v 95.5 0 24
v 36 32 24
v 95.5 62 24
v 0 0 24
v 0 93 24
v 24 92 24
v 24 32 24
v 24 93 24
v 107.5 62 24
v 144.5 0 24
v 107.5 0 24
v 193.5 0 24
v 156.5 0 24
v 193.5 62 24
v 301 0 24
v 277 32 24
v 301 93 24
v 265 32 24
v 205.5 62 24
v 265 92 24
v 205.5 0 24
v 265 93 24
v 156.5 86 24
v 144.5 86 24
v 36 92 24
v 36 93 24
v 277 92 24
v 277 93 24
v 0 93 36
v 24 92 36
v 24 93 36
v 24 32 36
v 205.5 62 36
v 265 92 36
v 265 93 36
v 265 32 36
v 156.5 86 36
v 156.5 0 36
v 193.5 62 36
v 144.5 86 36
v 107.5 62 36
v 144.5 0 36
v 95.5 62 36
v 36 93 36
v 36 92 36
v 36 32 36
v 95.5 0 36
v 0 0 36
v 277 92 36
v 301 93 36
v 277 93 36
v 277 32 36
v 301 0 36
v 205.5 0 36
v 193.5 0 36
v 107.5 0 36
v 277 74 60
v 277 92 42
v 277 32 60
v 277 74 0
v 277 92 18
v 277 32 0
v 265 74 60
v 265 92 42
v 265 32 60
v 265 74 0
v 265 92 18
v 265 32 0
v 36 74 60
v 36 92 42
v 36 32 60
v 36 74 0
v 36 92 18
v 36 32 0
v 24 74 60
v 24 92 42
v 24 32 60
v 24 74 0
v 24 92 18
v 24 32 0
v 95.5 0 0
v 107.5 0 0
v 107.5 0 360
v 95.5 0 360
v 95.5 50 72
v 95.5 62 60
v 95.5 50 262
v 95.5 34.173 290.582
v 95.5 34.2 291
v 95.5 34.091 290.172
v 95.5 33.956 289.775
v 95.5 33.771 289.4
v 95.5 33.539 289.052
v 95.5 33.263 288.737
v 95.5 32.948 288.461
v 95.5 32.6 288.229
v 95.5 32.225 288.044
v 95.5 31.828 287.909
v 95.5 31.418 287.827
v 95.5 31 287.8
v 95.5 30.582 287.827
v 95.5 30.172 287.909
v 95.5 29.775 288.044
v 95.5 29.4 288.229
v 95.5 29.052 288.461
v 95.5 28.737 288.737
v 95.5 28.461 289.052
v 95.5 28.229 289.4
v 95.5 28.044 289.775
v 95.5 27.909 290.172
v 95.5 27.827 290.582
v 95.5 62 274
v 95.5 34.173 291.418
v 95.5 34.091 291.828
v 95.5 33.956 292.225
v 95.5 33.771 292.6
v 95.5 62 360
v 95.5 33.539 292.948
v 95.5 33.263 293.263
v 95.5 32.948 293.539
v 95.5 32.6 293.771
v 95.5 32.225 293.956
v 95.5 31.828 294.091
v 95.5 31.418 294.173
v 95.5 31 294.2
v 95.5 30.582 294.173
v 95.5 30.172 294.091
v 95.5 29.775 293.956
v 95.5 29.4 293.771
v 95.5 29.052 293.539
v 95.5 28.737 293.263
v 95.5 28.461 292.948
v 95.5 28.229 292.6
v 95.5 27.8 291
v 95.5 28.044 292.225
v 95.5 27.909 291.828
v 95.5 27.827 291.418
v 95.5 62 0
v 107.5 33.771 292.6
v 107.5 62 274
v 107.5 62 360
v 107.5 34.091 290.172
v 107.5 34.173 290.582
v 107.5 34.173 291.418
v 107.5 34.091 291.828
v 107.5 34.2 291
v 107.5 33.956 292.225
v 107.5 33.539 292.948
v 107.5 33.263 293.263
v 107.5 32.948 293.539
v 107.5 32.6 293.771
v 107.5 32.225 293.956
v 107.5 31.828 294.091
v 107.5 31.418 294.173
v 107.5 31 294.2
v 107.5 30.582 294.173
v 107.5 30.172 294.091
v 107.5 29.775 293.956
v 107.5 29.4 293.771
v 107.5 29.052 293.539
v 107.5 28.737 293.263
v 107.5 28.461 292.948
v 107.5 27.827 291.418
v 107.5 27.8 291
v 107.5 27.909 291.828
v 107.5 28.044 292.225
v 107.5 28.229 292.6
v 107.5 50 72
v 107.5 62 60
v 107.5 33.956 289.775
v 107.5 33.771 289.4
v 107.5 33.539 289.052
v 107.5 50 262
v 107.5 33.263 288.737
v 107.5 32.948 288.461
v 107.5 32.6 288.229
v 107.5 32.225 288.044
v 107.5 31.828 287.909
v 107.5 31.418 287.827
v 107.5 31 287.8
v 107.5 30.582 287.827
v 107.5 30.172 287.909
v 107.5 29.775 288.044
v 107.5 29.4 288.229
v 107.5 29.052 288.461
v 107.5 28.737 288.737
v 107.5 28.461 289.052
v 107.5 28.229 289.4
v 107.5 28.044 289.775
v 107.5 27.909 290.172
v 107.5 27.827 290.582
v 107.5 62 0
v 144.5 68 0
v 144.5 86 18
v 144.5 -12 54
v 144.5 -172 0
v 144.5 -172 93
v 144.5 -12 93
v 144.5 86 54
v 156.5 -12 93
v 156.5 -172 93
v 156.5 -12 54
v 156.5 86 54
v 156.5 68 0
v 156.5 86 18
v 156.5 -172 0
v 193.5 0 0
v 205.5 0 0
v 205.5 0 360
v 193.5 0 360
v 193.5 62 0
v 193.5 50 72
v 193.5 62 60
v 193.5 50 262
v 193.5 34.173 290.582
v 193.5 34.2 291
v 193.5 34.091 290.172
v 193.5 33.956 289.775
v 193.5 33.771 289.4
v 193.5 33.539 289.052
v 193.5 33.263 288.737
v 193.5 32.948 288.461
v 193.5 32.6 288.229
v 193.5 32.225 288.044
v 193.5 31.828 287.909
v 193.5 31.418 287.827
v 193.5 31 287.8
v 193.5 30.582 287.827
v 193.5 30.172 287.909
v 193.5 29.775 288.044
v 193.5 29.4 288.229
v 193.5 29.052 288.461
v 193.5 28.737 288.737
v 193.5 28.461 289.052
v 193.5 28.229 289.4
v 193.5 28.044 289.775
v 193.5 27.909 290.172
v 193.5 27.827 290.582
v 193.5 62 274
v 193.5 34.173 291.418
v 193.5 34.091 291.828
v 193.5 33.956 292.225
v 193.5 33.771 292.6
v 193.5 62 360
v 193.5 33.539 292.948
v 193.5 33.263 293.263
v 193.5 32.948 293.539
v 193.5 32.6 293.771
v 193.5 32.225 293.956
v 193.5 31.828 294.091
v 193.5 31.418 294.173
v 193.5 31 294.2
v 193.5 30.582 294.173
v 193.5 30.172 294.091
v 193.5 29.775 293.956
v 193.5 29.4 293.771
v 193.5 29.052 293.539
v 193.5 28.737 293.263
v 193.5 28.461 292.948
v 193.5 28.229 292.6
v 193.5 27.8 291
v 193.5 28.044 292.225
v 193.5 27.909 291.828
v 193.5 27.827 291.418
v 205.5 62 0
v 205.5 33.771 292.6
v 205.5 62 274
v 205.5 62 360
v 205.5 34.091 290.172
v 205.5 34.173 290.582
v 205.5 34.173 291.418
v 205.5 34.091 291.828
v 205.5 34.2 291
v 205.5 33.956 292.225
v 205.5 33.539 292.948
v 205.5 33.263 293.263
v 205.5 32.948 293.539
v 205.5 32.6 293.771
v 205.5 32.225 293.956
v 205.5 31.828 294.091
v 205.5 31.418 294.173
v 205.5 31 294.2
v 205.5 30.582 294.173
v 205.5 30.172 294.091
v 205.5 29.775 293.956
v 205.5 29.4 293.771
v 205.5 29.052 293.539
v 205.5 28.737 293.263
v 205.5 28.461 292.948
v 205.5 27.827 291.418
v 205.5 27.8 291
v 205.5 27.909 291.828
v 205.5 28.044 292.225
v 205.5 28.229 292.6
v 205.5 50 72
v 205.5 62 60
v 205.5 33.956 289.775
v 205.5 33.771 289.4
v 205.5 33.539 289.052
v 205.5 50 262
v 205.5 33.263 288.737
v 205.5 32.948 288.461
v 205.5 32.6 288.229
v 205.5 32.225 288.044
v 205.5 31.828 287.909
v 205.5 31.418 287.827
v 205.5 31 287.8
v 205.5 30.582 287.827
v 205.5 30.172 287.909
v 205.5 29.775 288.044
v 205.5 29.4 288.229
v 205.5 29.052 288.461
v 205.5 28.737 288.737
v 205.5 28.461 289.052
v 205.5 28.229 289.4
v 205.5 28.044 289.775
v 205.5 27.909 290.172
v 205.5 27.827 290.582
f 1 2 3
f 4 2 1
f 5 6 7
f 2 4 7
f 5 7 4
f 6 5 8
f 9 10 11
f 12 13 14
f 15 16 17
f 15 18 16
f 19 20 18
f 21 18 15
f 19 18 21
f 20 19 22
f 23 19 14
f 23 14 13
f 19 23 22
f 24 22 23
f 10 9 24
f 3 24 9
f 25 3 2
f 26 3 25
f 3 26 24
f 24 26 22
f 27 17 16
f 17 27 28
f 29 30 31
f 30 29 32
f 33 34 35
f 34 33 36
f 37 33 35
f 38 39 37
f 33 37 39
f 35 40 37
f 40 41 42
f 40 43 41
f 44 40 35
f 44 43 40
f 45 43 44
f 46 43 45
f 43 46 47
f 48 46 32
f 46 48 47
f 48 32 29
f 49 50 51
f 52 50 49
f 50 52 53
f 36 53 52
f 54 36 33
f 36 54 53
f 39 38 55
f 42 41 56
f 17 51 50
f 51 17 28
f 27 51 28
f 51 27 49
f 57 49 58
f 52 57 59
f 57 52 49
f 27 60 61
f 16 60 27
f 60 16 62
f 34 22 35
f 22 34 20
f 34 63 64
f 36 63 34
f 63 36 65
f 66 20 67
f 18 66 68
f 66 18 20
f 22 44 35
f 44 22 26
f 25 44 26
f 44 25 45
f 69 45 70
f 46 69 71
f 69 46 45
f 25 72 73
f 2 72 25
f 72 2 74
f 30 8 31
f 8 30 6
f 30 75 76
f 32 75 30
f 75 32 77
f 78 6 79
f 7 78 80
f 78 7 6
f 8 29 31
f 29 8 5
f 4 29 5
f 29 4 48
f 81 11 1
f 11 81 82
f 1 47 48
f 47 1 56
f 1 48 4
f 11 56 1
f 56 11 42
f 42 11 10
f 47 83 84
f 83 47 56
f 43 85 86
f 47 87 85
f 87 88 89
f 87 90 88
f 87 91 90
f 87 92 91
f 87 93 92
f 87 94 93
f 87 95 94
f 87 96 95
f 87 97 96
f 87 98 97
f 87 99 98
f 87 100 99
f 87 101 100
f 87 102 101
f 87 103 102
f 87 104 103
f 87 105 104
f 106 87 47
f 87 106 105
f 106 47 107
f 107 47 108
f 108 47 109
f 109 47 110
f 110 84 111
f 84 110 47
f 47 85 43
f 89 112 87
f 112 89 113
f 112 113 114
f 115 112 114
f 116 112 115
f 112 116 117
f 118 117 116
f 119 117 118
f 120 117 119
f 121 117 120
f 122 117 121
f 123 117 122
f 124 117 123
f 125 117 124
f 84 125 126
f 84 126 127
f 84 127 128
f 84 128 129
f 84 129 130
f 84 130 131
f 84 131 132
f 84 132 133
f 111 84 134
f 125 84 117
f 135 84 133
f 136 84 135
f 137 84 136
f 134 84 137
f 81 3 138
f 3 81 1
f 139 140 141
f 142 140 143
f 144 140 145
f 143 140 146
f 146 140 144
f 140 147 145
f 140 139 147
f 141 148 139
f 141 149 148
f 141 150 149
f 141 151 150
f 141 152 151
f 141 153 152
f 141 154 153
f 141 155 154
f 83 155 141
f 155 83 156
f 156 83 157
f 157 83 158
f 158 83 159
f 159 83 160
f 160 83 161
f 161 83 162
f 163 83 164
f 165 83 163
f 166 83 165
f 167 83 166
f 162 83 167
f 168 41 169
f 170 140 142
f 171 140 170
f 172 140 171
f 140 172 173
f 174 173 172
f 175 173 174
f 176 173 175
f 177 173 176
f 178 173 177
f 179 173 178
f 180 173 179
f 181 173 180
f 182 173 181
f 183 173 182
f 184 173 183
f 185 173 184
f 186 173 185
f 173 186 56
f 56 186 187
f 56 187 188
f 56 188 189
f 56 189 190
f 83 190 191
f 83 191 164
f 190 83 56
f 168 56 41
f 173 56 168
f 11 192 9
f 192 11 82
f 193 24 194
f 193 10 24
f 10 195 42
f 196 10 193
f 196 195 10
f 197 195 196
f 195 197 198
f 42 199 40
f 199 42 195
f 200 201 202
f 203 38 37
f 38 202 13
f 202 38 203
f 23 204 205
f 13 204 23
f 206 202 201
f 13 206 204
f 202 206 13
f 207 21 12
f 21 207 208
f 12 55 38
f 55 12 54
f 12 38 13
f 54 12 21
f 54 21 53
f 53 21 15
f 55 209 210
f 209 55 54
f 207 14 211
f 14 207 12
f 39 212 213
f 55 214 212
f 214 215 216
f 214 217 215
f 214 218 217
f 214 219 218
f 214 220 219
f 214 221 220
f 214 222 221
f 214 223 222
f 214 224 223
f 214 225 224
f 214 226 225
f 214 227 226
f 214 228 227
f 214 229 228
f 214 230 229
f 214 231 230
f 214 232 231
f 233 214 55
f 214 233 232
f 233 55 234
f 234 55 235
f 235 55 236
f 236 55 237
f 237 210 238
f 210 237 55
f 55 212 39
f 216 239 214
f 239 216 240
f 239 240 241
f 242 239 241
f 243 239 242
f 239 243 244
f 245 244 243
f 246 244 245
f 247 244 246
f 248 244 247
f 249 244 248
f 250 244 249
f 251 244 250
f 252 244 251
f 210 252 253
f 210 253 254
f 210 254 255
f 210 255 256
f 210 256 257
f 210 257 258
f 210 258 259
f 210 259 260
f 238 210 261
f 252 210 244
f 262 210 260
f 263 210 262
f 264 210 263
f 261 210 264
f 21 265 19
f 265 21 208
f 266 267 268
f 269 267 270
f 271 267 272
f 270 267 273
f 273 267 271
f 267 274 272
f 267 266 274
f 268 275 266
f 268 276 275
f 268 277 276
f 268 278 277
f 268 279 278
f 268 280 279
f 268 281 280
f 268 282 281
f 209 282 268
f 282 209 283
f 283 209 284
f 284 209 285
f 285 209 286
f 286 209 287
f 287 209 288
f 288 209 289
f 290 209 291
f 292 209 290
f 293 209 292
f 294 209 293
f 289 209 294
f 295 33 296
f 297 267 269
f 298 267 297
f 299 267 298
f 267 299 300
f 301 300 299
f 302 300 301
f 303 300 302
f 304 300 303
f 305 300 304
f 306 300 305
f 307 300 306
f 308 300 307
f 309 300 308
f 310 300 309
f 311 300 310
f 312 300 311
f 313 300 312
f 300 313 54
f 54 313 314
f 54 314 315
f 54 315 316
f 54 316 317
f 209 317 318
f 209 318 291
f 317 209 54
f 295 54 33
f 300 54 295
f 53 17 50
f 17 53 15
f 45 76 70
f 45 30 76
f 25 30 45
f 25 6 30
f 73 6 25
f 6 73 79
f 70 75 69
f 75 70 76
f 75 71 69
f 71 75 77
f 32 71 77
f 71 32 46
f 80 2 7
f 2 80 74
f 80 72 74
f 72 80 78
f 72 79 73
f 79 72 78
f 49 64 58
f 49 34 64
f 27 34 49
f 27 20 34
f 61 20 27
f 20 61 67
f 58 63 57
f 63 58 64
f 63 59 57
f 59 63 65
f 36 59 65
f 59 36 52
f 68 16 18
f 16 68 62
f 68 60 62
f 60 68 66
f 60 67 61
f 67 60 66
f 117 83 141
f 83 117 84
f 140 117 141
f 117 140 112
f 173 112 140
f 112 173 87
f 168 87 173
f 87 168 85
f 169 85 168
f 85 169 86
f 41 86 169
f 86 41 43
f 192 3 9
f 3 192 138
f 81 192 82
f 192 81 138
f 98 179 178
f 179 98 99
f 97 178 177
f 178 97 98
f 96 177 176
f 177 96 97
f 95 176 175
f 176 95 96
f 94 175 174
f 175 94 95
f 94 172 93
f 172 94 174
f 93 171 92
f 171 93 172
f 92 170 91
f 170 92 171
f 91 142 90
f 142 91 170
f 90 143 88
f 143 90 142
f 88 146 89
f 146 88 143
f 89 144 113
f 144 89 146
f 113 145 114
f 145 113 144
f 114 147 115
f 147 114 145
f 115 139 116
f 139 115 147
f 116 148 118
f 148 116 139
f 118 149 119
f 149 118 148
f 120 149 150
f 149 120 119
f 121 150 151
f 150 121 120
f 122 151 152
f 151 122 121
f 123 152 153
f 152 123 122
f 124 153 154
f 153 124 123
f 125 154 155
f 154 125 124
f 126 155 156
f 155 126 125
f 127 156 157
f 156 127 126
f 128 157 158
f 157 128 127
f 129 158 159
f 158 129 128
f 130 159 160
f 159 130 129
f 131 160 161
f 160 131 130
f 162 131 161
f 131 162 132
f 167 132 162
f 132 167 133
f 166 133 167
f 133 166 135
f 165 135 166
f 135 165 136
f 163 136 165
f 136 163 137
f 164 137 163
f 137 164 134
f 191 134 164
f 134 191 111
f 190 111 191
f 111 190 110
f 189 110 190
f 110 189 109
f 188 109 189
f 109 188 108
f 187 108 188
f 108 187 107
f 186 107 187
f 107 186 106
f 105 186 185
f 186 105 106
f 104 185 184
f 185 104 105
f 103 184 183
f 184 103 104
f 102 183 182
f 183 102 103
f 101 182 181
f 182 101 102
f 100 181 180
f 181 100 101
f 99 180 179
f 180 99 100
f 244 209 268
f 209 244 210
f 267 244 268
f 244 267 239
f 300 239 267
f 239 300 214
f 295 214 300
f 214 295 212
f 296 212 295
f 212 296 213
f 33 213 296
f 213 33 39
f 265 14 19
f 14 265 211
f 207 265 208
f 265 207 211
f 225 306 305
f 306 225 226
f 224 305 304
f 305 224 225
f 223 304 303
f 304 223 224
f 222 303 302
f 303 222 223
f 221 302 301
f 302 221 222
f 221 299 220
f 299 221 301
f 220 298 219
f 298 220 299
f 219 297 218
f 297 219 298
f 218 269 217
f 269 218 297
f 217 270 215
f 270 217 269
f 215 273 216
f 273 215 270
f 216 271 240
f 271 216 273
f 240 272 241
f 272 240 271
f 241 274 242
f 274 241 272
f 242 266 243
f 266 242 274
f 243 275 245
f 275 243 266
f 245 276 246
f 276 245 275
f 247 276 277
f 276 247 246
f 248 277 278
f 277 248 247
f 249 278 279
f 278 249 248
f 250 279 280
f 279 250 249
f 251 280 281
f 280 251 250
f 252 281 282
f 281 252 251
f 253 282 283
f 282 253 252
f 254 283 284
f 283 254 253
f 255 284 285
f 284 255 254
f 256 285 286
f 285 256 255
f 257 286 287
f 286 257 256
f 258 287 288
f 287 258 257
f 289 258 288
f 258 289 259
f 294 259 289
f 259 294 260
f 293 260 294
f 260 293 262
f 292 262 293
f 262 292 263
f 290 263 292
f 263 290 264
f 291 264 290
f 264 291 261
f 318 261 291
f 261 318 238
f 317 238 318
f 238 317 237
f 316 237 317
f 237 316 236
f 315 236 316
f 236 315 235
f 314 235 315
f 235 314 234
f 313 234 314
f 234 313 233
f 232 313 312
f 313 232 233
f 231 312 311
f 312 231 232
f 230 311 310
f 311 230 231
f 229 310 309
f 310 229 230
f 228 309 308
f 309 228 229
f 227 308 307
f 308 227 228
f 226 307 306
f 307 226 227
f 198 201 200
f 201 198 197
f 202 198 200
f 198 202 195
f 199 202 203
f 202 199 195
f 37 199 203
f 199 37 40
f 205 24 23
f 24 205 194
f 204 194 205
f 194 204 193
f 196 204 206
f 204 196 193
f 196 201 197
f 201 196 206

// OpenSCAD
// ==========================================================================
//  GENERATED FILE -- DO NOT EDIT.
//  Produced by build/build.py from components/Turtle_Bottom_Ballast_Fin_v1.scad
//  Turtle Body version 2.3.1
//  Edit lib/ and src/ instead, then run: python3 build/build.py
// ==========================================================================
/*
 Hope Turtle — standalone ballast attachment. Units: mm.
 License: CERN-OHL-S-2.0.
 Two green core slats, one orange bottom board, two red lock feet, one
 yellow ballast fin. No bottle. Individual pieces lie flat on Z=0;
 the assembly raises its lowest component to Z=0.

 SOURCE FILE — geometry lives in lib/ballast_fin.scad + lib/params.scad.
 The committed self-contained file is generated by build/build.py.
*/

part = "assembly"; // [assembly,core_slat,bottom_board,lock_foot,fin]
enable_color_coding = true;
ballast_fin_inspection_pullout = 0; // mm; 0 seats the fin

// [bundle] begin use <../../lib/ballast_fin.scad>
// ==========================================================================
//  Turtle Body -- bottom ballast attachment  (lib module)
// --------------------------------------------------------------------------
//  Two green core slats, one orange bottom board, two red lock feet, one
//  yellow ballast fin. No bottle. See CLAUDE.md s12.
//
//  Use clear inner-face spacing (= bottle_diameter), not centre spacing, for
//  bottle clearance. The yellow fin's bottle-seat cut is enlarged by one
//  stock thickness so the bottle clears it -- preserved here. Ballast joints
//  keep nominal stock slot widths (the rear fin's 0.2 mm allowance is NOT
//  added here).
//
//  Definitions only. Geometry is emitted by local_ballast_assembly() or the
//  individual part modules.
// ==========================================================================

// [bundle] begin use <params.scad>
// ==========================================================================
//  Turtle Body -- shared dimension contract
// --------------------------------------------------------------------------
//  The single source of truth for every dimension that more than one
//  subsystem depends on. Values are exposed as zero-argument functions so
//  this file can be pulled in with `use <params.scad>` (which ignores
//  top-level variable assignments) without polluting any namespace.
//
//  lib/ modules take these as DEFAULT argument values:
//      module control_cap(roof_t = p_cap_roof_t(), ...) { ... }
//  so a src/ wrapper can still override one value from its customizer block
//  while every other subsystem keeps the shared number.
//
//  Rules:
//   * one function per concept, canonical name (see CLAUDE.md cross-file table)
//   * derived values are functions of other p_*() functions, never re-typed
//   * mm throughout; names say _d (diameter), _r (radius), _t (thickness),
//     _len / _h (axial), _af (hex across-flats)
//   * do NOT add a bare `x = ...;` here -- bundle.py / lint.py will reject it
// ==========================================================================

// ---- tolerances and render quality --------------------------------------
function p_eps()          = 0.02;   // Boolean overlap / cut-through fudge
function p_fit_clearance() = 0.2;   // wood joint: TOTAL extra slot width, centred on the board
function p_fn_plastic()   = 120;    // printed PLA parts (cap, cage, axle, mold)
function p_fn_wood()      = 96;     // cut wooden parts
function p_fn_curve()     = 180;    // fine profile curves (bottle, sails)

// ---- bottle (the foundation reference) ---------------------------------
function p_bottle_d()        = 86;    // outside diameter (was 82; other bottle dims held)
function p_bottle_h()        = 305;   // total height incl. ordinary screw cap
function p_bottle_wall_t()   = 0.5;   // modelling assumption, not a measurement
function p_bottle_cap_d()    = 31;    // ordinary screw cap (NOT the control-cap disk)
function p_bottle_cap_h()    = 17;    // ordinary screw cap height (rear-fin / ballast formulas)
function p_collar_d()        = 34;    // bottle collar, independent of cap diameter
function p_top_dome_h()      = 62;
function p_bottom_dome_h()   = 25;
function p_dome_power()      = 2.5;   // superellipse exponent
function p_bottle_neck_h()   = 5;
function p_bottle_collar_h() = 1;
function p_bottle_neck_d()   = p_bottle_cap_d() - 3;   // 28: neck is 3 mm under the cap
function p_bottle_base_ratio() = 0.88; // slightly narrower footprint at the base
function p_bottle_profile_steps() = 16;
// cut bottle (control head): the lower dome is removed and a short socket is
// bored so the control-cap insert slides in. Cut plane sits 5 mm above the
// bottom dome height.
function p_bottle_cut_extra()  = 5;
function p_bottle_cut_height() = p_bottom_dome_h() + p_bottle_cut_extra();   // 30

// nominal bottle interior and the cap insert that enters it
function p_bottle_socket_d() = p_bottle_d() - 2 * p_bottle_wall_t();          // 81
function p_insert_shaft_radial_clearance() = 1;
function p_insert_shaft_d()  = p_bottle_socket_d()
                             - 2 * p_insert_shaft_radial_clearance();          // 79

// ---- wooden stock -----------------------------------------------------
function p_wood_t()          = 12;    // shared board / slat thickness
function p_fin_board_w()     = 93;    // shared fin-system stock width
function p_screw_side_offset() = 25;  // mounting-hole inset from a John end

// ---- Ecojoiner port --------------------------------------------------
// A port must swallow the bottle's tapered top (the top dome) plus a seating
// allowance, so its axial length is DERIVED from the bottle, not fixed. This
// is the same rule the HopeTurtles.org generators use
// (port_length = taper_height + port_allowance); until 2026-09-08 lib carried
// the evaluated constant 82 instead, which silently broke the rule for any
// bottle other than the reference one. Ballast and Ecojoiner both read it.
function p_port_allowance()  = 20;                 // seating allowance beyond the dome
function p_port_length()     = p_top_dome_h() + p_port_allowance();   // 62 + 20 = 82
function p_port_height()     = p_bottle_d();       // opening height == bottle diameter (asserted)

// ---- M6 hardware ---------------------------------------------------
function p_m6_clearance_d()  = 6.4;   // M6 clearance hole
function p_m6_bolt_shaft_d() = 6;     // visual placeholder only
function p_m6_bolt_head_d()  = 12;
function p_m6_bolt_head_t()  = 4;

// ---- control cap (large stationary disk; see CLAUDE.md s7) ----------
//  TB-03 resolution: repository 5 mm roof / 2 mm boss is authoritative;
//  the axle (below) is derived to this datum.
function p_cap_disk_d()      = 100;   // control-cap disk (independent of p_bottle_cap_d)
function p_cap_roof_t()      = 5;     // disk / roof thickness
function p_cap_boss_depth()  = 1.5;   // extra projection of the centre boss into the hollow cap
                                       // (was 2; lowered 0.5 mm -> 6.5 mm axle bearing length)
function p_cap_boss_d()      = 18;
function p_cap_insert_len()  = 35;    // straight insert shaft length
function p_cap_insert_wall_t() = 4;
function p_cap_entry_chamfer_h()     = 1;
function p_cap_entry_chamfer_delta() = 1;
function p_cap_axle_bore_d() = 8.7;   // 0.35 mm radial clearance to the Ø8 shaft (was 8.6 / 0.3 mm)
function p_cap_cage_radial_clearance() = 1;   // cap disk -> cage inner wall (radial)
function p_cap_total_h()     = p_cap_roof_t() + p_cap_insert_len();           // 40
function p_cap_bearing_len() = p_cap_roof_t() + p_cap_boss_depth();           // 6.5 (was 7)

// buttons (through both cap and cage)
function p_button_upper_d()  = 17;    // clearance hole in the cap
function p_button_axis()     = "y";   // "x" or "y"
function p_button_radius()   = 25;    // radial position of the two button centres (50 mm apart;
                                       // was 24 / 48 mm -- shared with the cage's matching bore)

// ---- silicone seal grooves + rings (CLAUDE.md s8) ------------------
function p_seal_groove_count()      = 2;
function p_seal_groove_axial_h()    = 2.7; // groove height (was 3.5; retuned to just clear
                                            // the 2.6 mm ring axial thickness below, 0.1 mm margin)
function p_seal_groove_radial_depth() = 2; // groove depth
function p_seal_groove1_from_shoulder() = 12;  // groove centre, measured from the insert SHOULDER
function p_seal_groove2_from_shoulder() = 25;
function p_seal_ring_axial_t()      = 2.6;  // cast ring thickness (was 3)
function p_seal_ring_radial_w()     = 10;   // cast ring radial width (was 5; doubled). NOT validated.
function p_seal_ring_elasticity_reduction() = 0.25;
    // Cast the ring's inner diameter this fraction SMALLER than the groove
    // root it mates to, so real (stretchy) silicone is under tension --
    // and therefore actually grips -- once stretched onto the cap, instead
    // of sitting at a 1:1 as-cast fit. Tweak this here as real silicone
    // behaviour is characterized; NOT validated (see lib/silicone_ring_mold.scad).
function p_seal_groove_root_d() = p_insert_shaft_d()
                                - 2 * p_seal_groove_radial_depth();            // 79 at the 86 mm bottle

// ---- round / hex centre axle (CLAUDE.md s9) -----------------------
//  Derived to the 5/2 cap datum (TB-03/TB-04). round_inside_cap is measured
//  from the roof underside and INCLUDES the boss -- do not add the boss again.
function p_axle_round_d()        = 8;
function p_axle_round_ext()      = 1;    // projection above the cap's outer face
function p_axle_round_inside_cap() = p_cap_insert_len() - 5;  // 30: roof underside to round end (incl. boss)
function p_axle_round_len()      = p_axle_round_inside_cap() + p_cap_roof_t() + p_axle_round_ext();  // 36
function p_axle_hex_af()         = 10.0; // shaft across-flats (0.3 mm to the Ø10.3 cage bore)
function p_axle_hex_len()        = 23;
function p_axle_join_overlap()   = 0.2;  // hex<->round Boolean overlap
function p_axle_total_len()      = p_axle_hex_len() + p_axle_round_len();
function p_axle_hex_corner_d()   = p_axle_hex_af() / cos(30);                  // ~11.55
function p_magnet_d()            = 3;    // AS5600 sensing magnet recess
function p_magnet_t()            = 1;

// ---- axle rotary shaft O-ring (waterproofs the axle bore; cast in the mold) ----
//  A round-section O-ring seated in a gland in the control-cap bore, sealing
//  against the spinning round section of the axle. ID is tied to the shaft.
function p_axle_oring_cs()     = 2.0;                                   // cross-section
function p_axle_oring_id()     = p_axle_round_d();                      // 8 -- hugs the shaft
function p_axle_oring_od()     = p_axle_oring_id() + 2 * p_axle_oring_cs();          // 12
function p_axle_oring_mean_r() = (p_axle_oring_id() + p_axle_oring_cs()) / 2;        // 5
//  gland cut into the cap bore for it
function p_cap_oring_squeeze()      = 0.25;  // radial squeeze on the seal
function p_cap_oring_gland_od()     = p_axle_oring_od() - 2 * p_cap_oring_squeeze(); // 11.5
function p_cap_oring_gland_w()      = 1.3 * p_axle_oring_cs();                       // 2.6 axial
function p_cap_oring_gland_from_face() = 3.5; // gland centre, from the cap outer face, along the bore

// ---- rotating control cage (CLAUDE.md s6) ------------------------
function p_cage_wall_t()     = 6.5;   // radial wall thickness
function p_cage_roof_t()     = 4;     // roof / surface plate thickness
function p_cage_inner_d()    = p_cap_disk_d() + 2 * p_cap_cage_radial_clearance();   // 102
function p_cage_outer_d()    = p_cage_inner_d() + 2 * p_cage_wall_t();               // 115
function p_cage_skirt_depth()   = 44;   // roof underside to the ORIGINAL skirt rim
function p_cage_peak_extension() = 20;  // crest extends this far past the original rim
function p_cage_valley_wall_h()  = 10;  // minimum wall depth between mounts
function p_cage_total_h()    = p_cage_skirt_depth() + p_cage_roof_t();              // 48 (native)
function p_cage_notch_count()   = 4;
function p_cage_notch_w()    = 22.5;  // batten groove width
function p_cage_notch_depth() = 3.7;
function p_cage_wave_segments() = 240;
function p_cage_hub_d()      = 29;
function p_cage_pocket_d()   = 26;    // top clip pocket (control_cage top_pocket, OFF by default)
function p_cage_pocket_depth() = 4;   //   "        "     "
function p_cage_hex_bore_af() = 10.3; // central hex bore (0.3 mm to the Ø10.0 shaft)
function p_cage_bearing_d()  = 9;     // hemispherical bearing bump
function p_cage_bearing_count() = 8;
function p_cage_bearing_pcd() = p_cap_disk_d() - p_cage_bearing_d() + 0.5;          // 91.5
function p_cage_top_hole_d() = 18;    // central button / access hole through the roof
function p_cage_mount_hole_d() = 3.2; // two M3 clearance holes per batten / groove
function p_cage_mount_pitch()  = 32;  // vertical pitch of the pair
function p_cage_lower_hole_from_tip() = 10;
// 45-deg outward chamfer on the roof-top outer edge (0 = sharp). The cage
// prints roof-face-down, so this bevel flares OUT from the bed and stays
// printable; it runs the full perimeter, batten grooves included. See
// lib/control_cage.scad.
function p_cage_roof_bevel() = 3;

// ---- sail apparatus (CLAUDE.md s10) ---------------------------
function p_side_batten_h()   = 205;
function p_side_batten_w()   = 20;
function p_side_batten_radial_t() = 10;
function p_top_crossbar_len() = 6 * p_bottle_d();   // 492
function p_top_crossbar_w()  = 22;
function p_top_crossbar_t()  = p_wood_t();          // 12
function p_sail_bar_axle_hole_d() = 12;             // Ø12; fits the ~11.55 hex corner dia
function p_bottom_rail_len() = 3 * p_bottle_d();    // 246
function p_bottom_rail_bottle_clearance() = 1;
function p_sail_rail_color()  = [0.56, 0.39, 0.39]; // brown (top AND bottom rails)
function p_c_piece_color()    = [1.0, 0.52, 0.20];  // orange, retained

// ---- rear fin + solar support (CLAUDE.md s11) ----------------
function p_solar_panel_w() = 148;
function p_solar_panel_h() = 223;
function p_solar_panel_t() = 2.5;    // real panel, independent of wood thickness
function p_rear_shaft_len() = p_bottle_h()
                            + (2/3) * (p_fin_board_w() - 2 * p_wood_t())
                            - p_bottle_cap_h();                                 // 334
function p_rear_half_lap_engagement() = 42;   // green/yellow interlock depth
function p_rear_fin_tab_width() = 15;
function p_rear_shaft_width()   = 59;
// TB-07: the green-slat mounting hole follows the mating Ecojoiner John, not a
// fixed 50 mm. Derived from the install transform; the john_length/2 terms
// cancel, leaving a pure function of the shared contract (= 103 at defaults).
function p_rear_shaft_hole_from_front() =
    p_rear_shaft_len() - p_screw_side_offset() - p_bottle_h()
    + p_bottle_cap_h() + p_port_height();

// ---- ballast attachment (CLAUDE.md s12) ---------------------
function p_ballast_core_w()   = p_bottle_d() - 2 * p_wood_t();                  // 58
function p_ballast_core_len() = p_bottle_h() - p_bottle_cap_h() + 6 * p_wood_t();  // 360
function p_ballast_slat_gap() = p_bottle_d();          // clear inner-face gap
function p_ballast_slat_spacing() = p_bottle_d() + p_wood_t();                  // 94
function p_ballast_board_len() = 3.5 * p_bottle_d();   // 287
function p_ballast_fin_len()   = 3 * p_bottle_d();     // 246
function p_ballast_lock_w()    = 5 * p_wood_t();       // 60

// ---- neutral wood shades (used when enable_color_coding = false) -------
// With the full colour code off, every wooden subsystem still renders in its
// OWN shade of brown so the parts stay visually separable. All are warm browns
// (R > G > B) spaced by lightness. The two large fins share one darker shade so
// they read as a matched pair, distinct from the rest of their own assembly.
function p_wood_shade_sail()     = [0.85, 0.66, 0.47]; // sail frame  (lightest)
function p_wood_shade_rear_fin() = [0.72, 0.50, 0.33]; // rear-fin shafts + solar holder
function p_wood_shade_eco()      = [0.62, 0.44, 0.28]; // Ecojoiner core
function p_wood_shade_ballast()  = [0.52, 0.34, 0.22]; // ballast slats / board / locks
function p_wood_shade_fin()      = [0.40, 0.26, 0.17]; // rear fin + ballast fin, shared (darkest)
// [bundle] end   <params.scad>
// [bundle] begin use <util.scad>
// ==========================================================================
//  Turtle Body -- shared helper modules and functions
// --------------------------------------------------------------------------
//  Small pieces that were copy-pasted across the standalone files. Geometry
//  lives in the per-subsystem lib/ modules; this file is only glue.
//
//  Definitions only -- no top-level geometry, no top-level assignments.
// ==========================================================================

// [bundle] begin use <params.scad>
// [bundle] already inlined: params.scad
// [bundle] end   <params.scad>

// Colour wrapper for wooden parts. When colour coding is off, every wooden
// component renders in one neutral wood tone; bottles, hardware, sails and
// printed parts keep their own colours and never call this.
module wood_color(coded_color, enabled = true, neutral = [0.94, 0.83, 0.62]) {
    color(enabled ? coded_color : neutral) children();
}

// scalar clamp
function clamp(v, lo, hi) = v < lo ? lo : (v > hi ? hi : v);

// Visual-only M6 bolt: plain shaft + hex-less cylindrical head. No thread,
// no torque rating -- a placeholder for fit inspection.
//  Local Z=0 is the underside of the head; the shaft runs toward +Z from Z=0
//  (plus an optional tip_extension), the head sits at Z=-head_t..0. Matches
//  the standalone files.
module m6_bolt_placeholder(grip_length, tip_extension = 1,
                           shaft_d = undef, head_d = undef, head_t = undef,
                           color_rgb = [0.15, 0.15, 0.15], fn = 48) {
    sd = shaft_d == undef ? p_m6_bolt_shaft_d() : shaft_d;
    hd = head_d  == undef ? p_m6_bolt_head_d()  : head_d;
    ht = head_t  == undef ? p_m6_bolt_head_t()  : head_t;
    assert(grip_length > 0, "m6_bolt_placeholder: grip_length must be positive.");
    color(color_rgb)
        union() {
            cylinder(d = sd, h = grip_length + tip_extension, $fn = fn);
            translate([0, 0, -ht])
                cylinder(d = hd, h = ht, $fn = fn);
        }
}

// Regular hexagonal prism specified by across-flats width (OpenSCAD's
// cylinder($fn=6) is specified across corners, which is the usual trap).
module hex_prism_af(across_flats, h, center = false) {
    cylinder(d = across_flats / cos(30), h = h, $fn = 6, center = center);
}
// [bundle] end   <util.scad>

function bl_t()            = p_wood_t();
function bl_core_w()       = p_bottle_d() - 2 * bl_t();                          // 58
function bl_core_h()       = p_bottle_h() - p_bottle_cap_h() + 6.0 * bl_t();     // 360
function bl_lower_lobe()   = 2 * bl_t();
function bl_upper_lobe()   = 2 * bl_t();
function bl_core_slot_h()  = bl_t();
function bl_core_slot_depth() = bl_core_w() / 2;
function bl_neck_w()       = p_bottle_d() - 3 * bl_t();                          // 46
function bl_shoulder_step()   = bl_core_w() - bl_neck_w();                       // 12
function bl_upper_diag_start() = bl_core_h() - p_port_height();
function bl_upper_neck_start() = bl_upper_diag_start() - bl_shoulder_step();
function bl_core_slot_z0() = bl_lower_lobe();
function bl_core_slot_z1() = bl_core_slot_z0() + bl_core_slot_h();
function bl_lower_full_return() = bl_core_slot_z1() + bl_upper_lobe();
function bl_lower_neck_start()  = bl_lower_full_return() + bl_shoulder_step();
function bl_mount_hole_from_top() = p_port_length() + bl_t() - p_screw_side_offset();  // 69
function bl_mount_hole_x()  = bl_core_w() / 2;
function bl_mount_hole_y()  = bl_core_h() - bl_mount_hole_from_top();

function bl_board_len()    = 3.5 * p_bottle_d();                                 // 287
function bl_board_w()      = p_fin_board_w();                                    // 93
function bl_board_slot_w() = bl_t();
function bl_board_slot_depth()  = p_fin_board_w() / 3;
function bl_center_slot_depth() = p_bottle_d() / 2;
function bl_center_slot()  = bl_board_len() / 2;
function bl_slat_spacing() = p_bottle_d() + bl_t();                             // 94
function bl_left_slot()    = bl_center_slot() - bl_slat_spacing() / 2;
function bl_right_slot()   = bl_center_slot() + bl_slat_spacing() / 2;
function bl_end_slot_offset() = 2 * bl_t();
function bl_left_end_slot_x0()  = bl_end_slot_offset();
function bl_right_end_slot_x0() = bl_board_len() - bl_end_slot_offset() - bl_board_slot_w();

function bl_lock_w()       = 5 * bl_t();                                         // 60
function bl_lock_h()       = 5 * bl_t();
function bl_lock_t()       = bl_t();
function bl_lock_slot_depth() = bl_lock_w() / 2;
function bl_lock_slot_h()  = bl_t();
function bl_lock_chamfer() = 1.5 * bl_t();

function bl_fin_len()      = 3 * p_bottle_d();                                   // 246
function bl_fin_h()        = p_fin_board_w();                                    // 93
function bl_fin_t()        = bl_t();
function bl_fin_lower_protrusion() = 2 * bl_t();
function bl_fin_slot_h()   = bl_t();
function bl_fin_slot_depth()   = p_bottle_d() / 2;
function bl_fin_upper_cut_depth() = p_bottle_d() + bl_t();   // +1 stock thickness so the bottle clears
function bl_fin_upper_cut_z0()    = bl_fin_lower_protrusion() + bl_fin_slot_h() + 1.5 * bl_t();
function bl_fin_front_chamfer()   = 1.5 * bl_t();

module bl_assert_valid() {
    t = bl_t();
    assert(p_bottle_h() > p_bottle_cap_h() && t > 0 && p_bottle_d() > 3 * t);
    assert(bl_core_h() - p_bottle_d() - t > 6 * t, "ballast: slat shoulders overlap.");
    assert(p_m6_clearance_d() > 0 && p_m6_clearance_d() < p_bottle_d() - 2 * t);
    assert(bl_mount_hole_from_top() > p_m6_clearance_d() / 2
           && bl_mount_hole_from_top() < p_bottle_d() - p_m6_clearance_d() / 2,
           "ballast: mount hole misses the upper slat end.");
    assert(p_fin_board_w() > max(4.5 * t, p_bottle_d() / 2), "ballast: fin board too narrow.");
    assert(bl_core_w() == p_port_height() - 2 * t,
           "ballast: slat width must use the shared bottle diameter.");
    assert(abs((bl_core_h() - bl_upper_diag_start()) - p_port_height()) < 0.001,
           "ballast: top shoulder cut must begin one port_height below the slat top.");
    assert(abs((bl_slat_spacing() - bl_t()) - p_bottle_d()) < 0.001,
           "ballast: slat inner-face gap must equal the shared bottle diameter.");
    assert(abs(bl_center_slot_depth() - bl_fin_slot_depth()) < 0.001,
           "ballast: orange-base and yellow-fin slots must have equal depth.");
}

// ---- 2D profiles + parts -------------------------------------------
module bl_core_profile_2d()
    polygon([[0, 0], [bl_core_w(), 0],
             [bl_core_w(), bl_core_h()], [0, bl_core_h()],
             [0, bl_upper_diag_start()],
             [bl_shoulder_step(), bl_upper_neck_start()],
             [bl_shoulder_step(), bl_lower_neck_start()],
             [0, bl_lower_full_return()],
             [0, bl_core_slot_z1()],
             [bl_core_slot_depth(), bl_core_slot_z1()],
             [bl_core_slot_depth(), bl_core_slot_z0()],
             [0, bl_core_slot_z0()]]);

module ballast_core_slat_part(colored = true)
    wood_color([0.12, 0.38, 0.20], colored, p_wood_shade_ballast())
        linear_extrude(height = bl_t()) difference() {
            bl_core_profile_2d();
            translate([bl_mount_hole_x(), bl_mount_hole_y()])
                circle(d = p_m6_clearance_d(), $fn = 48);
        }

module ballast_bottom_board_part(colored = true) {
    e = 0.01;
    wood_color([0.90, 0.38, 0.06], colored, p_wood_shade_ballast())
    linear_extrude(height = bl_t()) difference() {
        square([bl_board_len(), bl_board_w()]);
        translate([bl_left_slot() - bl_board_slot_w() / 2, -e])
            square([bl_board_slot_w(), bl_board_slot_depth() + e]);
        translate([bl_center_slot() - bl_board_slot_w() / 2, -e])
            square([bl_board_slot_w(), bl_center_slot_depth() + e]);
        translate([bl_right_slot() - bl_board_slot_w() / 2, -e])
            square([bl_board_slot_w(), bl_board_slot_depth() + e]);
        translate([bl_left_end_slot_x0(), bl_board_w() - bl_board_slot_depth()])
            square([bl_board_slot_w(), bl_board_slot_depth() + e]);
        translate([bl_right_end_slot_x0(), bl_board_w() - bl_board_slot_depth()])
            square([bl_board_slot_w(), bl_board_slot_depth() + e]);
    }
}

module bl_lock_profile_2d() {
    y0 = (bl_lock_h() - bl_lock_slot_h()) / 2;
    y1 = y0 + bl_lock_slot_h();
    ch = bl_lock_chamfer();
    polygon([[0, 0], [bl_lock_w() - ch, 0], [bl_lock_w(), ch],
             [bl_lock_w(), bl_lock_h() - ch], [bl_lock_w() - ch, bl_lock_h()],
             [0, bl_lock_h()], [0, y1], [bl_lock_slot_depth(), y1],
             [bl_lock_slot_depth(), y0], [0, y0]]);
}

module ballast_lock_part(colored = true)
    wood_color([0.70, 0.12, 0.10], colored, p_wood_shade_ballast())
        linear_extrude(height = bl_lock_t()) bl_lock_profile_2d();

module bl_fin_profile_2d() {
    e = 0.01; ch = bl_fin_front_chamfer();
    difference() {
        polygon([[ch, 0], [bl_fin_len(), 0], [bl_fin_len(), bl_fin_h()],
                 [0, bl_fin_h()], [0, ch]]);
        translate([-e, bl_fin_lower_protrusion()])
            square([bl_fin_slot_depth() + e, bl_fin_slot_h()]);
        translate([-e, bl_fin_upper_cut_z0()])
            square([bl_fin_upper_cut_depth() + e, bl_fin_h() - bl_fin_upper_cut_z0() + e]);
    }
}

// Shares p_wood_shade_fin() with the rear fin so the two large fins read as a
// matched pair, distinct from the rest of the ballast.
module ballast_fin_part(colored = true)
    wood_color([0.95, 0.72, 0.02], colored, p_wood_shade_fin())
        linear_extrude(height = bl_fin_t()) bl_fin_profile_2d();

// ---- local assembly ------------------------------------------------
module bl_installed_green_slat(slot_center_x, colored = true)
    multmatrix([[0, 0, 1, slot_center_x - bl_t() / 2],
                [-1, 0, 0, bl_core_w()],
                [0, 1, 0, -bl_core_slot_z0()],
                [0, 0, 0, 1]])
        ballast_core_slat_part(colored);

module bl_installed_lock(slot_x0, colored = true) {
    lock_center_x = slot_x0 + bl_board_slot_w() / 2;
    lock_origin_y = (bl_board_w() - bl_board_slot_depth()) - bl_lock_slot_depth();
    y0 = (bl_lock_h() - bl_lock_slot_h()) / 2;
    multmatrix([[0, 0, 1, lock_center_x - bl_lock_t() / 2],
                [1, 0, 0, lock_origin_y],
                [0, 1, 0, -y0],
                [0, 0, 0, 1]])
        ballast_lock_part(colored);
}

module bl_installed_fin(inspection_pullout = 0, colored = true) {
    fin_origin_y = bl_center_slot_depth() + bl_fin_slot_depth() + inspection_pullout;
    multmatrix([[0, 0, 1, bl_center_slot() - bl_fin_t() / 2],
                [-1, 0, 0, fin_origin_y],
                [0, 1, 0, -bl_fin_lower_protrusion()],
                [0, 0, 0, 1]])
        ballast_fin_part(colored);
}

module local_ballast_assembly(inspection_pullout = 0, colored = true) {
    bl_assert_valid();
    ballast_bottom_board_part(colored);
    bl_installed_lock(bl_left_end_slot_x0(), colored);
    bl_installed_lock(bl_right_end_slot_x0(), colored);
    bl_installed_green_slat(bl_left_slot(), colored);
    bl_installed_green_slat(bl_right_slot(), colored);
    bl_installed_fin(inspection_pullout, colored);

    echo("BALLAST: slat w/len/t = ", bl_core_w(), bl_core_h(), bl_t(),
         " | inner-face gap = ", bl_slat_spacing() - bl_t(),
         " | M6 from slat top = ", bl_mount_hole_from_top());
}
// [bundle] end   <../../lib/ballast_fin.scad>

if (part == "assembly") {
    translate([0, 0, max(bl_lower_lobe(),
                         (bl_lock_h() - bl_lock_slot_h()) / 2,
                         bl_fin_lower_protrusion())])
        local_ballast_assembly(inspection_pullout = ballast_fin_inspection_pullout,
                               colored = enable_color_coding);
} else if (part == "core_slat") {
    ballast_core_slat_part(colored = enable_color_coding);
} else if (part == "bottom_board") {
    ballast_bottom_board_part(colored = enable_color_coding);
} else if (part == "lock_foot") {
    ballast_lock_part(colored = enable_color_coding);
} else if (part == "fin") {
    ballast_fin_part(colored = enable_color_coding);
} else {
    assert(false, str("Unknown part: ", part));
}
